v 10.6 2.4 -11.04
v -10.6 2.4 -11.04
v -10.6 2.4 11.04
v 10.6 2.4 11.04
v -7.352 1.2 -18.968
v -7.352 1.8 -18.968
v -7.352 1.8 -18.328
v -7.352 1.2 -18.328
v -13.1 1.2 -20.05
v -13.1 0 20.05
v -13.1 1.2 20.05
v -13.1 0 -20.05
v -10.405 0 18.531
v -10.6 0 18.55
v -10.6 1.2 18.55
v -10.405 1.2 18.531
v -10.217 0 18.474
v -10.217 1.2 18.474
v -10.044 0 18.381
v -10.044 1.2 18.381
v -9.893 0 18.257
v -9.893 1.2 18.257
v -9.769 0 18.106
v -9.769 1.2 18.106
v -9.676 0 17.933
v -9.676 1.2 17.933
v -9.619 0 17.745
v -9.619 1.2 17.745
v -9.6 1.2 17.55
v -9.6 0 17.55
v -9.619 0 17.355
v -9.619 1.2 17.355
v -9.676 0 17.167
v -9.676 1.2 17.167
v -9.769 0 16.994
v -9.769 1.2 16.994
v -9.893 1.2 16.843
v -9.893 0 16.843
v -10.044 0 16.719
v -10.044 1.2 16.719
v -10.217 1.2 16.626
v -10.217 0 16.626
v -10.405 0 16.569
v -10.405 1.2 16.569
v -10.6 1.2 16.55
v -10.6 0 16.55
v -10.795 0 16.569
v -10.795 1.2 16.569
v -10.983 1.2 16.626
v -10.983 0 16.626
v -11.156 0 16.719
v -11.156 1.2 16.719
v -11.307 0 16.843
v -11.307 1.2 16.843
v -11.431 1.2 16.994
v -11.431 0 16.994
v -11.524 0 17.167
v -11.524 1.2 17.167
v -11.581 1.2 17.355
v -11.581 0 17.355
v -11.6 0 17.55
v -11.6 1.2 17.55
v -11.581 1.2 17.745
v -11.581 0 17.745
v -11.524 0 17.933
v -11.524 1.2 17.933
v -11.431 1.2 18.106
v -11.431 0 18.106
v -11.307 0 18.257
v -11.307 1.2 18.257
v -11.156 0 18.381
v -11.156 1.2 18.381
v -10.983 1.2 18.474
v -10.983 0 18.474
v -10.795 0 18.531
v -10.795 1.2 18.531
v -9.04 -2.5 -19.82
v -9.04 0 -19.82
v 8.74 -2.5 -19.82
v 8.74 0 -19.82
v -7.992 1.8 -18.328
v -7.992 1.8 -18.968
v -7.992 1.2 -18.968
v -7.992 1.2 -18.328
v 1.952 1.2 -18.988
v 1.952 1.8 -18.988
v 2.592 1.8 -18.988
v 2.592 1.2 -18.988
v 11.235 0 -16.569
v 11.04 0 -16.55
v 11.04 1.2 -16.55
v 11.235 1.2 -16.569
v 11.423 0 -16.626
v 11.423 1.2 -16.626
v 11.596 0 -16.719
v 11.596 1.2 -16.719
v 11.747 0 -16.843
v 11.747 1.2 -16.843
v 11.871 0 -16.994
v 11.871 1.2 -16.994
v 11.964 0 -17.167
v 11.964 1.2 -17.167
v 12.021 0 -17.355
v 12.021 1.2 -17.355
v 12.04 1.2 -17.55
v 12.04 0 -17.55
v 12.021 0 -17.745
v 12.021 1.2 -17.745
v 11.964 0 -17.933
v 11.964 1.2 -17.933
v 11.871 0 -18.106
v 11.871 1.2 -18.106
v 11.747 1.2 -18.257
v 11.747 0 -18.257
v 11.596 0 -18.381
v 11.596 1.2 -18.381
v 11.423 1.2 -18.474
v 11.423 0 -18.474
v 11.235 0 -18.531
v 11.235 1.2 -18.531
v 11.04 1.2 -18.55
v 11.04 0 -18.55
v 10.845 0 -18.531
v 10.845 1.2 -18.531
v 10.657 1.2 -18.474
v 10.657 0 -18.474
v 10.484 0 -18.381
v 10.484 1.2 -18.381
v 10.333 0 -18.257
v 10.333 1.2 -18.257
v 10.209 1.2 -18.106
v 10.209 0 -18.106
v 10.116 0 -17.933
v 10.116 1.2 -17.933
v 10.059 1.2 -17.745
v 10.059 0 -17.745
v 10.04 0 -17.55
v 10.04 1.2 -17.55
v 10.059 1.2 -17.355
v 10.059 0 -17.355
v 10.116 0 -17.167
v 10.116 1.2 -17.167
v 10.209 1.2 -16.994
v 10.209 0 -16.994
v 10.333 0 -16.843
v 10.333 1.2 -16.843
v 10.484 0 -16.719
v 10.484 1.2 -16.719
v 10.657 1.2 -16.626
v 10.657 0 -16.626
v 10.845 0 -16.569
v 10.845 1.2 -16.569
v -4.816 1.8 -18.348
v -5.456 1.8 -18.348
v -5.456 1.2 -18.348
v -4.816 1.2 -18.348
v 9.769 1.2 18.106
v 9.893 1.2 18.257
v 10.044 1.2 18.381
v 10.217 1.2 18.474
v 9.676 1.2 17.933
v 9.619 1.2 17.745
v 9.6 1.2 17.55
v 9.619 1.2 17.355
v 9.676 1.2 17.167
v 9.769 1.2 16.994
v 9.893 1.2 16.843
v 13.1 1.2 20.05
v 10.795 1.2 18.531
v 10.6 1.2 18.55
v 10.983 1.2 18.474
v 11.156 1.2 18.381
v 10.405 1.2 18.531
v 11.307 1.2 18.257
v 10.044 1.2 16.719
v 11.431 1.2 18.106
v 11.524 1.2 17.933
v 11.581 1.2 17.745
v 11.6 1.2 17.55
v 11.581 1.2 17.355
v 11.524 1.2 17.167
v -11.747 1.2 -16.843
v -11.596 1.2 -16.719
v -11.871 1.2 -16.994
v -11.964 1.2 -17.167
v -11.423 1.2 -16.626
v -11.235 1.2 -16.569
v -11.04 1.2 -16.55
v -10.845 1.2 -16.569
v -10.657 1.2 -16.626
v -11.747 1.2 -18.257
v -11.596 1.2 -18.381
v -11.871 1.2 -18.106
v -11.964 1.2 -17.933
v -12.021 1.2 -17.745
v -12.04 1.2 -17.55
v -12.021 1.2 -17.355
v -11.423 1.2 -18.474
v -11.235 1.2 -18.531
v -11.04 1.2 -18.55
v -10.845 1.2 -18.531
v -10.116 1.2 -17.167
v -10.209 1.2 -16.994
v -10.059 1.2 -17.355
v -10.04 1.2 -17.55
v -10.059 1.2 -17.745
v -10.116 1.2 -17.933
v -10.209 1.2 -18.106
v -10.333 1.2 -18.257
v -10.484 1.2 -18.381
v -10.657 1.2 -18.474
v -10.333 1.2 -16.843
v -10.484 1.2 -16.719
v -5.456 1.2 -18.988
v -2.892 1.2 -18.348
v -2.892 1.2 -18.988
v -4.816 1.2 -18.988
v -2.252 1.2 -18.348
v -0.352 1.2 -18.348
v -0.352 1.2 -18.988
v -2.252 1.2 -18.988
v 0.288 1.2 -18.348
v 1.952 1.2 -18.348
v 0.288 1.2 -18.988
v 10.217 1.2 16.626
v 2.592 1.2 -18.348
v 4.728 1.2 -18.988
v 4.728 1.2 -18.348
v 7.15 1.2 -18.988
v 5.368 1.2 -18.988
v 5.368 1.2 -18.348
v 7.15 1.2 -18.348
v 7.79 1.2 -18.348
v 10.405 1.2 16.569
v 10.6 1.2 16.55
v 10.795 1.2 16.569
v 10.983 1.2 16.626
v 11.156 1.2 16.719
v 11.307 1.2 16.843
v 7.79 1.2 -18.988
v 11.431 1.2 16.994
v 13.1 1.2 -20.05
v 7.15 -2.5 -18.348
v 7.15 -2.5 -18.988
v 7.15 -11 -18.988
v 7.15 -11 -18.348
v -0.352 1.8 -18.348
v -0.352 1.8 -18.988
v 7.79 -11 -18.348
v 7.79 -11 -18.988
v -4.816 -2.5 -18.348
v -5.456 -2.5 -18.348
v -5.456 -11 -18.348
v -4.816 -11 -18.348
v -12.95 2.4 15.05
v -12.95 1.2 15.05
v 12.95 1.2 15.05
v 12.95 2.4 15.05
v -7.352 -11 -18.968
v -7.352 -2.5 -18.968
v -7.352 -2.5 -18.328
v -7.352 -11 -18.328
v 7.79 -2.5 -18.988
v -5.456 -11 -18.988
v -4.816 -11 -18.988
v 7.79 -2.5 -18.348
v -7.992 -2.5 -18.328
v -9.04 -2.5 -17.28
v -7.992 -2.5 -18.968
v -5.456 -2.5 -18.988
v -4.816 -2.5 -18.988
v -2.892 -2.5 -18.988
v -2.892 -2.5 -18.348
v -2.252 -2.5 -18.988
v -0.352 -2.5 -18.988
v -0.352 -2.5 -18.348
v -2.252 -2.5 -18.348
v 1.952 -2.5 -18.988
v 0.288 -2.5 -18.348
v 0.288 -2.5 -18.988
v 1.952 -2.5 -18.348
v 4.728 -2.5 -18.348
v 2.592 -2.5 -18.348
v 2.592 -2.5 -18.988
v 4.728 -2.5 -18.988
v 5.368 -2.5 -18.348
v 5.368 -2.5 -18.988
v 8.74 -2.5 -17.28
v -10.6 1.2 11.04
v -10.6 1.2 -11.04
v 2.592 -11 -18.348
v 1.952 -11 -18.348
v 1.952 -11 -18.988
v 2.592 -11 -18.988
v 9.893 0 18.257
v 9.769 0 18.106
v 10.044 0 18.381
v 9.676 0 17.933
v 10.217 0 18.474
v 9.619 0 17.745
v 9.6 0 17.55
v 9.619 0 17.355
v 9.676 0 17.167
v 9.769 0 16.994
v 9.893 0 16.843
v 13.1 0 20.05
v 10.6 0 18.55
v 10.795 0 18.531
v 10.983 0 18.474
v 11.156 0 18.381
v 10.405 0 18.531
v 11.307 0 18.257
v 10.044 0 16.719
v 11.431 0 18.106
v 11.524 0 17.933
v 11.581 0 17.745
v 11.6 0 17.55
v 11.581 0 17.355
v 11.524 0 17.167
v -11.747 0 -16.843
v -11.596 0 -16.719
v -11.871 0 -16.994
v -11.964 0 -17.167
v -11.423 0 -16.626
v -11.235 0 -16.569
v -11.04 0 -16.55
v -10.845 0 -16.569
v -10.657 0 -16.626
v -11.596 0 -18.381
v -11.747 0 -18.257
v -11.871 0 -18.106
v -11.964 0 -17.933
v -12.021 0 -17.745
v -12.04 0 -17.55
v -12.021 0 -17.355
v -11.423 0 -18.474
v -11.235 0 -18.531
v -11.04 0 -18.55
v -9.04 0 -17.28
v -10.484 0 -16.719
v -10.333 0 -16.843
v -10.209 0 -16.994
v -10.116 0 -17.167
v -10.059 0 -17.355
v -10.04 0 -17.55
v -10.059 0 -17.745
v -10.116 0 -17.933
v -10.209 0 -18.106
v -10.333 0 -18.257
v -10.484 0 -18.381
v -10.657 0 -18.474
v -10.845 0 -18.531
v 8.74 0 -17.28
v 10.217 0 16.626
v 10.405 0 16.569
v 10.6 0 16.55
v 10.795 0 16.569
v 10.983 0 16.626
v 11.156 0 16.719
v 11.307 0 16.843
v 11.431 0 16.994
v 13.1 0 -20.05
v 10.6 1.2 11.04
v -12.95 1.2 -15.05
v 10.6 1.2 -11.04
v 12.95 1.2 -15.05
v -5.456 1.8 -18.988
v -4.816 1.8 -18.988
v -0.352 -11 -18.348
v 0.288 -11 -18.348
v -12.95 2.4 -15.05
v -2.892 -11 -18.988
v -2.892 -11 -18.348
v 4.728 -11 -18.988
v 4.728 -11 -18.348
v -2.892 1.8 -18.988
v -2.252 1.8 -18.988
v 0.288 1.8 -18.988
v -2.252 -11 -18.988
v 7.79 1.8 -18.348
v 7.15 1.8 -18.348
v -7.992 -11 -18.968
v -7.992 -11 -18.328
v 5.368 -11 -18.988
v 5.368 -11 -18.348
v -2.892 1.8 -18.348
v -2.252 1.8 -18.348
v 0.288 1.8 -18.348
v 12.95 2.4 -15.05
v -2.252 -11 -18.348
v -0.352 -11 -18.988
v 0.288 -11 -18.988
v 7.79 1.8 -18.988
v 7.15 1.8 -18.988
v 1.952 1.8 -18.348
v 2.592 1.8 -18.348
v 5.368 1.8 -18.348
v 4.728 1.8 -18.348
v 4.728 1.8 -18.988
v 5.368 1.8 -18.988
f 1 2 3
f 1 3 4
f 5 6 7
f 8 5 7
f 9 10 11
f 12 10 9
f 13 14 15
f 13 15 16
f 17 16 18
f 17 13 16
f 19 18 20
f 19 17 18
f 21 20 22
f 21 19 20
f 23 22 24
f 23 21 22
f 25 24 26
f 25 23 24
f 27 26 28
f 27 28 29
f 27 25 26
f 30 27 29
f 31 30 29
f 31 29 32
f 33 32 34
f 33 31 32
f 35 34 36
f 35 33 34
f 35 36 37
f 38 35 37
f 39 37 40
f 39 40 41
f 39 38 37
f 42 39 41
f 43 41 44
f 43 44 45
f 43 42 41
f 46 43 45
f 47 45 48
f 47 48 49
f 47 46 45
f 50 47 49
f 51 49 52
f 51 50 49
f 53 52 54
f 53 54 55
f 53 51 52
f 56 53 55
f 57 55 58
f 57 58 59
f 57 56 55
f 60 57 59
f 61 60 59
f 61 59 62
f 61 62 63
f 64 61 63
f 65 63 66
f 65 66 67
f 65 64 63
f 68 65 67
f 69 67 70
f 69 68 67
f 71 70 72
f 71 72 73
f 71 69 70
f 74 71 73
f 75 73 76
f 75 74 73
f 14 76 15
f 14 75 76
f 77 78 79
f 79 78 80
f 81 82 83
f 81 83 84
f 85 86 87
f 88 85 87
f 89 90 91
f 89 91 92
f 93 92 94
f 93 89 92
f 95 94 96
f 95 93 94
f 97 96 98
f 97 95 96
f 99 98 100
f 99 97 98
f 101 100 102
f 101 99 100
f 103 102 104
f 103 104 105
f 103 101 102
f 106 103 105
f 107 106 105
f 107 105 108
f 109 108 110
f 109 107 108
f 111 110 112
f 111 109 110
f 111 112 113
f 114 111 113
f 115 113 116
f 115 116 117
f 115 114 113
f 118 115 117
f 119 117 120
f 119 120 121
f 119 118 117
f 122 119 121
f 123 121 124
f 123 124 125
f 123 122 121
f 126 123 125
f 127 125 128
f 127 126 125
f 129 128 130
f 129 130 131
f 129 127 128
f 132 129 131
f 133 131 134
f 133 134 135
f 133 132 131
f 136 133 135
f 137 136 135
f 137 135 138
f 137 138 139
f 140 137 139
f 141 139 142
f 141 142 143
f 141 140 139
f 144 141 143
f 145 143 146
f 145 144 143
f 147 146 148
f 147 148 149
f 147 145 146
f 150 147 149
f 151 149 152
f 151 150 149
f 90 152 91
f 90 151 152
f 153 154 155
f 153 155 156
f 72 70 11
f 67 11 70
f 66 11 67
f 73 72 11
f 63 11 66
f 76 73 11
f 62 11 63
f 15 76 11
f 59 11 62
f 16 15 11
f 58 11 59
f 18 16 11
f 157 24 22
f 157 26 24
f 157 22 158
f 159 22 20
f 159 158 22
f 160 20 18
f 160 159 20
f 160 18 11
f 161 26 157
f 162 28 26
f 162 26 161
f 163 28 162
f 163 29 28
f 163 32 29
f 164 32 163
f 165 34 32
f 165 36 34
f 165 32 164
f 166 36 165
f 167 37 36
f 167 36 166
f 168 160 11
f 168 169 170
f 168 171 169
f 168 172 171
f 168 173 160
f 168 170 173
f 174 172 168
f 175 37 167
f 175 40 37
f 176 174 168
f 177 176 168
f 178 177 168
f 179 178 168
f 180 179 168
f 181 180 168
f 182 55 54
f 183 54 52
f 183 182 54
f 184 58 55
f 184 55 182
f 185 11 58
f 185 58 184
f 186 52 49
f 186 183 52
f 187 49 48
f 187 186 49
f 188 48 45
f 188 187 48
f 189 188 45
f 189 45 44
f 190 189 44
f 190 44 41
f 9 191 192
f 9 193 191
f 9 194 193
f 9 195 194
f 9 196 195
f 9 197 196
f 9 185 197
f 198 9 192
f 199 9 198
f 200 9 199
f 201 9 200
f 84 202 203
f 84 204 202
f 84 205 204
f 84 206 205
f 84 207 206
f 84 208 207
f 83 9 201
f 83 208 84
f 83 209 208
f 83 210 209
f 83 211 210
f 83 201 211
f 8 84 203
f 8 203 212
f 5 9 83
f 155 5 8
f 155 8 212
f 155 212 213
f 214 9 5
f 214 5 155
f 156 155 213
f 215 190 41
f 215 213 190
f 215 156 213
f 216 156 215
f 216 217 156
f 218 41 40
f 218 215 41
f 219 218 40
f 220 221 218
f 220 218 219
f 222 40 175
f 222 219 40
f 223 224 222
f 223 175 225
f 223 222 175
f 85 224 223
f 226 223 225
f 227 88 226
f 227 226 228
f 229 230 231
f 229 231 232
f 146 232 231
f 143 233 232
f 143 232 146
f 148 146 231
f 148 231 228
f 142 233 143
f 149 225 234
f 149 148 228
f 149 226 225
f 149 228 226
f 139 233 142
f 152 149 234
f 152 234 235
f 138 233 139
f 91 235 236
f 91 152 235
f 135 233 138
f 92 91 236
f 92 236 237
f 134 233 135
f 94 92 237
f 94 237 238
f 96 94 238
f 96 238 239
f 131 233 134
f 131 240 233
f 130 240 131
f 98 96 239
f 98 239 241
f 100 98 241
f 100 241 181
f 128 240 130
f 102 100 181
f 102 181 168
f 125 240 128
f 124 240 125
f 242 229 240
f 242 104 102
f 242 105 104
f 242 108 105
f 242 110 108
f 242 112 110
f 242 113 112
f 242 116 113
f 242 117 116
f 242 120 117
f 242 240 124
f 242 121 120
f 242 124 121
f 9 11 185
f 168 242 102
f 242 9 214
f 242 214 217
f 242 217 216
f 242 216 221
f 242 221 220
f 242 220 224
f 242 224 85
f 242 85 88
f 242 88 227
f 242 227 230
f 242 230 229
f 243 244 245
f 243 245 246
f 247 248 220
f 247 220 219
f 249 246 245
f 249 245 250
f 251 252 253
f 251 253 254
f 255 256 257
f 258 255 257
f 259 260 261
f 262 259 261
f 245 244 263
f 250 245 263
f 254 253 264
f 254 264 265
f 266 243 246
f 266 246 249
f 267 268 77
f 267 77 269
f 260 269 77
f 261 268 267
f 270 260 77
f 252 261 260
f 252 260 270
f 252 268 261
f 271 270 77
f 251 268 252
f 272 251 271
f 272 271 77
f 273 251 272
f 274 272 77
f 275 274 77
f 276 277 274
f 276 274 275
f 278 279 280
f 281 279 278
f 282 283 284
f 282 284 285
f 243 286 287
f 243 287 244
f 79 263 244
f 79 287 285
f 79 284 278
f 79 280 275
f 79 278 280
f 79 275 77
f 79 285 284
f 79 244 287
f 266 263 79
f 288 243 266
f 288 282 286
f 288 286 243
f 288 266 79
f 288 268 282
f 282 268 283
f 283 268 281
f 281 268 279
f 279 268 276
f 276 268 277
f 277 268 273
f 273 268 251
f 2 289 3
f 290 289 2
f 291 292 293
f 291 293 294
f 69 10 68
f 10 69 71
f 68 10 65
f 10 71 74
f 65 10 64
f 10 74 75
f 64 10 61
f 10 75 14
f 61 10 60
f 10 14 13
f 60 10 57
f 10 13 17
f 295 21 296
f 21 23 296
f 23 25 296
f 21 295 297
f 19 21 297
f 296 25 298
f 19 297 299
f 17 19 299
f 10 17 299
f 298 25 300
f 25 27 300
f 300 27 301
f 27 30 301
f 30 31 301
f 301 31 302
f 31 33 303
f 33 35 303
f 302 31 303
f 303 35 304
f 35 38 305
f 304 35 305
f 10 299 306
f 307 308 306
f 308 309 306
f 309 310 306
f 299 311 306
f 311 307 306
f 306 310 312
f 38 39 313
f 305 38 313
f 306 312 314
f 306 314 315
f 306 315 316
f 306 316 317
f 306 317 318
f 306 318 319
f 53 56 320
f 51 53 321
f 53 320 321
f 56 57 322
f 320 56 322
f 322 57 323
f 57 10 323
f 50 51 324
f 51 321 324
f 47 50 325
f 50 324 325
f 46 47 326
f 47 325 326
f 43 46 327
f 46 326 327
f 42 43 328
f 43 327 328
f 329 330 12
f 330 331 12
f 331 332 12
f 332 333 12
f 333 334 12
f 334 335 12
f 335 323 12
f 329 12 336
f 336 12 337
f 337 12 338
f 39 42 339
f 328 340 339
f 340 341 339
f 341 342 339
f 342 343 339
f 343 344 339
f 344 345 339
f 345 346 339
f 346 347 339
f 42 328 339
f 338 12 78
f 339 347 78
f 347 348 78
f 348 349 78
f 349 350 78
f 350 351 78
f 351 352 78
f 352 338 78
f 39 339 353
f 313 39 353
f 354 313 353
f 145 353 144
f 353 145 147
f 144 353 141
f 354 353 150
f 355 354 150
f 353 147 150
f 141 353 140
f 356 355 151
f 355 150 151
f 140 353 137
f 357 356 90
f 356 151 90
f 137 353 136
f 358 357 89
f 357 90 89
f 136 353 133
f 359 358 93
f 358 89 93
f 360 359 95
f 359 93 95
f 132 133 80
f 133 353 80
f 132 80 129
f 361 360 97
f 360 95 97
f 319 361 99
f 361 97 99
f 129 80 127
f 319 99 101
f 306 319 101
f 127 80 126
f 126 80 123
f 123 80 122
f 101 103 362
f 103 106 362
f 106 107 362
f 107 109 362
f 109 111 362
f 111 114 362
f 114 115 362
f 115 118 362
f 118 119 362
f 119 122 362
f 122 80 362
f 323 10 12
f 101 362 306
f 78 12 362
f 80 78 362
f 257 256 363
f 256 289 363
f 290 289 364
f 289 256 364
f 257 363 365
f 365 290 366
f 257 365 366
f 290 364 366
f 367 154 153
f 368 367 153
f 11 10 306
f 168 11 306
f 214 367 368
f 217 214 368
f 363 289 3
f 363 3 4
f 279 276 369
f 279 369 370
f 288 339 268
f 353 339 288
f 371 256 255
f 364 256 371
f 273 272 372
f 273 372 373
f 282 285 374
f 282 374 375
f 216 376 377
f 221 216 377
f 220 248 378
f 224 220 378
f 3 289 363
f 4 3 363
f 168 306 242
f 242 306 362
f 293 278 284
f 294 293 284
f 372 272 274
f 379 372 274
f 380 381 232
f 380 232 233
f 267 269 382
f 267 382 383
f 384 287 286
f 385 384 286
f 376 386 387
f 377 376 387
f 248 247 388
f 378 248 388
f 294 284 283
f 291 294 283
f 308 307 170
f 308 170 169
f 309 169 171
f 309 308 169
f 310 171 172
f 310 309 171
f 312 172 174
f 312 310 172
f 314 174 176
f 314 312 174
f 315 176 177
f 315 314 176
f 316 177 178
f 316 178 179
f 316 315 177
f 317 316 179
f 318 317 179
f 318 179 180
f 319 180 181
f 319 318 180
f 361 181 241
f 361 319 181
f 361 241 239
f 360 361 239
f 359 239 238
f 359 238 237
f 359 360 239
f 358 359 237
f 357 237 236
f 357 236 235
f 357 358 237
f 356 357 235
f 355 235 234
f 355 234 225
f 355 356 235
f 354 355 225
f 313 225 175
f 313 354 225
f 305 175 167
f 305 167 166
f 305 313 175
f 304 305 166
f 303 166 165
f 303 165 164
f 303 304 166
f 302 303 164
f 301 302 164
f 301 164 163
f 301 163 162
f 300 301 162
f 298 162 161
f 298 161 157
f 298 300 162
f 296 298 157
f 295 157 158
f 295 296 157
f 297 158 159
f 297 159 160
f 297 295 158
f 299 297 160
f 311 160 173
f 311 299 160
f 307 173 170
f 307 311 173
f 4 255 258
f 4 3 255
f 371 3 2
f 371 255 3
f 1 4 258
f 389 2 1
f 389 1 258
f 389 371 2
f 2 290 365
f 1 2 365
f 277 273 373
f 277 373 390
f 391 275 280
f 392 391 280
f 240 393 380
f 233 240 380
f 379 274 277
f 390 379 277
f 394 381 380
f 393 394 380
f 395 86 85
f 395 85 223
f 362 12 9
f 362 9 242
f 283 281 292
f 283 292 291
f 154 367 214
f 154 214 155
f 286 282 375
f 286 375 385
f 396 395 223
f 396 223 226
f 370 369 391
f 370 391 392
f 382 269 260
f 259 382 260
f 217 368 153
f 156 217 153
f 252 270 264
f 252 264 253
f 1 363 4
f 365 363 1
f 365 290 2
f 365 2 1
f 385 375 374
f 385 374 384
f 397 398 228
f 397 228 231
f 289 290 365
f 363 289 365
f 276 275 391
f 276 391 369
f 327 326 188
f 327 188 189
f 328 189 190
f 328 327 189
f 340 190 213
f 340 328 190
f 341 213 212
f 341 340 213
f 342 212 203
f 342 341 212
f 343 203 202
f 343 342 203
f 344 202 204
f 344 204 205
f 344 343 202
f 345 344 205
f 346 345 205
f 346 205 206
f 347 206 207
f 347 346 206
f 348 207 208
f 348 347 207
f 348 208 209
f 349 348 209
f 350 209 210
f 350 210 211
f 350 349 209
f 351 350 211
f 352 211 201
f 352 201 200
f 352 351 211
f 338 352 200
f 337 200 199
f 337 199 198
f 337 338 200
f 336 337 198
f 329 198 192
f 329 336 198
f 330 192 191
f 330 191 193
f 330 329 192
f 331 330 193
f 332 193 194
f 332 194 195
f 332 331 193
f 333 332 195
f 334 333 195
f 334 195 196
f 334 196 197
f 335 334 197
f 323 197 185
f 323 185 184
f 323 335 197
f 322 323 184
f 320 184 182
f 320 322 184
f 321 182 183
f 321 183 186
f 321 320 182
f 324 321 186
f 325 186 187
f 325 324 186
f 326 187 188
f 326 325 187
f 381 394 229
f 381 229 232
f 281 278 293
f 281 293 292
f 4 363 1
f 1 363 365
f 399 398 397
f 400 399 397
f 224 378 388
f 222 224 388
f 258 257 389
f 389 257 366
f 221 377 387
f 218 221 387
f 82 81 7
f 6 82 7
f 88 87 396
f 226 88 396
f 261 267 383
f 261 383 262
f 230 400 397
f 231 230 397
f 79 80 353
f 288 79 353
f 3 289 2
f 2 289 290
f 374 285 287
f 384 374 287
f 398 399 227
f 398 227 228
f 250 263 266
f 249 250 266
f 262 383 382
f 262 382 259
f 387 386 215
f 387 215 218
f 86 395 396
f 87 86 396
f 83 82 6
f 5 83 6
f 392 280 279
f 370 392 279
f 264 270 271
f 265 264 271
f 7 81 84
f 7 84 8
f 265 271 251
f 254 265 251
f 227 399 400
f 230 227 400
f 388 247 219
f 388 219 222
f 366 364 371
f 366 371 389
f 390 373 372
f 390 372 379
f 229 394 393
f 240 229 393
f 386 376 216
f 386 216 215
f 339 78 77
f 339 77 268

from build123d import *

# Parameters (mm, degrees)
PCB_2_W                   = 26.2
PCB_2_H                   = 40.1
PCB_2_R                   = 1
PCB_DEPTH                 = 1.2
OLED_2_W                  = 25.9
OLED_2_H                  = 30.1
OLED_2_W_2                = 21.2
OLED_2_H_2                = 22.08
OLED_DEPTH                = 1.2
OLED_2_2_W                = 21.2
OLED_2_2_H                = 22.08
OLED_3_DEPTH              = 1.2
SKETCH_2_54_W             = 17.78
SKETCH_2_54_H             = 2.54
SKETCH_2_54_W_2           = 0.64
SKETCH_2_54_H_2           = 0.64
EXTRUDE_2_54_0_DEPTH      = 2.5
EXTRUDE_2_54_1_DEPTH      = 11
EXTRUDE_2_54_1_DEPTH_BACK = 1.8
SKETCH_2_54_3_W           = 0.64
SKETCH_2_54_3_H           = 0.64


with BuildPart() as part:
    # PCB 2 → PCB (new body)
    with BuildSketch(Plane(origin=(0, 0, 0), x_dir=(1, 0, 0), z_dir=(0, 1, 0))):
        Rectangle(PCB_2_W, PCB_2_H)
        with Locations((-10.6, -17.55)):
            Circle(PCB_2_R, mode=Mode.SUBTRACT)
        with Locations((10.6, -17.55)):
            Circle(PCB_2_R, mode=Mode.SUBTRACT)
        with Locations((-11.04, 17.55)):
            Circle(PCB_2_R, mode=Mode.SUBTRACT)
        with Locations((11.04, 17.55)):
            Circle(PCB_2_R, mode=Mode.SUBTRACT)
    extrude(amount=PCB_DEPTH)

    # 2.54端子草图 → 2.54端子0 (add)
    with BuildSketch(Plane.XZ):
        with Locations((-0.15, -18.55)):
            Rectangle(SKETCH_2_54_W, SKETCH_2_54_H)
        with Locations((7.47, -18.667667874)):
            Rectangle(SKETCH_2_54_W_2, SKETCH_2_54_H_2, mode=Mode.SUBTRACT)
        with Locations((5.047667874, -18.667667874)):
            Rectangle(SKETCH_2_54_W_2, SKETCH_2_54_H_2, mode=Mode.SUBTRACT)
        with Locations((2.272332126, -18.667667874)):
            Rectangle(SKETCH_2_54_W_2, SKETCH_2_54_H_2, mode=Mode.SUBTRACT)
        with Locations((-0.032332126, -18.667667874)):
            Rectangle(SKETCH_2_54_W_2, SKETCH_2_54_H_2, mode=Mode.SUBTRACT)
        with Locations((-2.572332126, -18.667667874)):
            Rectangle(SKETCH_2_54_W_2, SKETCH_2_54_H_2, mode=Mode.SUBTRACT)
        with Locations((-5.136389737, -18.667667874)):
            Rectangle(SKETCH_2_54_W_2, SKETCH_2_54_H_2, mode=Mode.SUBTRACT)
        with Locations((-7.672296396, -18.647703604)):
            Rectangle(SKETCH_2_54_W_2, SKETCH_2_54_H_2, mode=Mode.SUBTRACT)
    extrude(amount=EXTRUDE_2_54_0_DEPTH)

    # 2.54端子草图<3> → 2.54端子1 (add, two sides: drawn at the far end of the back side and taken through both)
    with BuildSketch(Plane.XZ.offset(-EXTRUDE_2_54_1_DEPTH_BACK)):
        with Locations((7.47, -18.667667874)):
            Rectangle(SKETCH_2_54_3_W, SKETCH_2_54_3_H)
        with Locations((5.047667874, -18.667667874)):
            Rectangle(SKETCH_2_54_3_W, SKETCH_2_54_3_H)
        with Locations((2.272332126, -18.667667874)):
            Rectangle(SKETCH_2_54_3_W, SKETCH_2_54_3_H)
        with Locations((-0.032332126, -18.667667874)):
            Rectangle(SKETCH_2_54_3_W, SKETCH_2_54_3_H)
        with Locations((-2.572332126, -18.667667874)):
            Rectangle(SKETCH_2_54_3_W, SKETCH_2_54_3_H)
        with Locations((-5.136389737, -18.667667874)):
            Rectangle(SKETCH_2_54_3_W, SKETCH_2_54_3_H)
        with Locations((-7.672296396, -18.647703604)):
            Rectangle(SKETCH_2_54_3_W, SKETCH_2_54_3_H)
    extrude(amount=EXTRUDE_2_54_1_DEPTH + EXTRUDE_2_54_1_DEPTH_BACK)


with BuildPart() as body_2:
    # OLED 2 → OLED (new body)
    with BuildSketch(Plane(origin=(0, 1.2, 0), x_dir=(1, 0, 0), z_dir=(0, 1, 0))):
        Rectangle(OLED_2_W, OLED_2_H)
        Rectangle(OLED_2_W_2, OLED_2_H_2, mode=Mode.SUBTRACT)
    extrude(amount=OLED_DEPTH)


with BuildPart() as body_3:
    # OLED_2 2 → OLED 3 (new body)
    with BuildSketch(Plane(origin=(0, 1.2, 0), x_dir=(1, 0, 0), z_dir=(0, 1, 0))):
        Rectangle(OLED_2_2_W, OLED_2_2_H)
    extrude(amount=OLED_3_DEPTH)


solid = Compound([part.part, body_2.part, body_3.part])
